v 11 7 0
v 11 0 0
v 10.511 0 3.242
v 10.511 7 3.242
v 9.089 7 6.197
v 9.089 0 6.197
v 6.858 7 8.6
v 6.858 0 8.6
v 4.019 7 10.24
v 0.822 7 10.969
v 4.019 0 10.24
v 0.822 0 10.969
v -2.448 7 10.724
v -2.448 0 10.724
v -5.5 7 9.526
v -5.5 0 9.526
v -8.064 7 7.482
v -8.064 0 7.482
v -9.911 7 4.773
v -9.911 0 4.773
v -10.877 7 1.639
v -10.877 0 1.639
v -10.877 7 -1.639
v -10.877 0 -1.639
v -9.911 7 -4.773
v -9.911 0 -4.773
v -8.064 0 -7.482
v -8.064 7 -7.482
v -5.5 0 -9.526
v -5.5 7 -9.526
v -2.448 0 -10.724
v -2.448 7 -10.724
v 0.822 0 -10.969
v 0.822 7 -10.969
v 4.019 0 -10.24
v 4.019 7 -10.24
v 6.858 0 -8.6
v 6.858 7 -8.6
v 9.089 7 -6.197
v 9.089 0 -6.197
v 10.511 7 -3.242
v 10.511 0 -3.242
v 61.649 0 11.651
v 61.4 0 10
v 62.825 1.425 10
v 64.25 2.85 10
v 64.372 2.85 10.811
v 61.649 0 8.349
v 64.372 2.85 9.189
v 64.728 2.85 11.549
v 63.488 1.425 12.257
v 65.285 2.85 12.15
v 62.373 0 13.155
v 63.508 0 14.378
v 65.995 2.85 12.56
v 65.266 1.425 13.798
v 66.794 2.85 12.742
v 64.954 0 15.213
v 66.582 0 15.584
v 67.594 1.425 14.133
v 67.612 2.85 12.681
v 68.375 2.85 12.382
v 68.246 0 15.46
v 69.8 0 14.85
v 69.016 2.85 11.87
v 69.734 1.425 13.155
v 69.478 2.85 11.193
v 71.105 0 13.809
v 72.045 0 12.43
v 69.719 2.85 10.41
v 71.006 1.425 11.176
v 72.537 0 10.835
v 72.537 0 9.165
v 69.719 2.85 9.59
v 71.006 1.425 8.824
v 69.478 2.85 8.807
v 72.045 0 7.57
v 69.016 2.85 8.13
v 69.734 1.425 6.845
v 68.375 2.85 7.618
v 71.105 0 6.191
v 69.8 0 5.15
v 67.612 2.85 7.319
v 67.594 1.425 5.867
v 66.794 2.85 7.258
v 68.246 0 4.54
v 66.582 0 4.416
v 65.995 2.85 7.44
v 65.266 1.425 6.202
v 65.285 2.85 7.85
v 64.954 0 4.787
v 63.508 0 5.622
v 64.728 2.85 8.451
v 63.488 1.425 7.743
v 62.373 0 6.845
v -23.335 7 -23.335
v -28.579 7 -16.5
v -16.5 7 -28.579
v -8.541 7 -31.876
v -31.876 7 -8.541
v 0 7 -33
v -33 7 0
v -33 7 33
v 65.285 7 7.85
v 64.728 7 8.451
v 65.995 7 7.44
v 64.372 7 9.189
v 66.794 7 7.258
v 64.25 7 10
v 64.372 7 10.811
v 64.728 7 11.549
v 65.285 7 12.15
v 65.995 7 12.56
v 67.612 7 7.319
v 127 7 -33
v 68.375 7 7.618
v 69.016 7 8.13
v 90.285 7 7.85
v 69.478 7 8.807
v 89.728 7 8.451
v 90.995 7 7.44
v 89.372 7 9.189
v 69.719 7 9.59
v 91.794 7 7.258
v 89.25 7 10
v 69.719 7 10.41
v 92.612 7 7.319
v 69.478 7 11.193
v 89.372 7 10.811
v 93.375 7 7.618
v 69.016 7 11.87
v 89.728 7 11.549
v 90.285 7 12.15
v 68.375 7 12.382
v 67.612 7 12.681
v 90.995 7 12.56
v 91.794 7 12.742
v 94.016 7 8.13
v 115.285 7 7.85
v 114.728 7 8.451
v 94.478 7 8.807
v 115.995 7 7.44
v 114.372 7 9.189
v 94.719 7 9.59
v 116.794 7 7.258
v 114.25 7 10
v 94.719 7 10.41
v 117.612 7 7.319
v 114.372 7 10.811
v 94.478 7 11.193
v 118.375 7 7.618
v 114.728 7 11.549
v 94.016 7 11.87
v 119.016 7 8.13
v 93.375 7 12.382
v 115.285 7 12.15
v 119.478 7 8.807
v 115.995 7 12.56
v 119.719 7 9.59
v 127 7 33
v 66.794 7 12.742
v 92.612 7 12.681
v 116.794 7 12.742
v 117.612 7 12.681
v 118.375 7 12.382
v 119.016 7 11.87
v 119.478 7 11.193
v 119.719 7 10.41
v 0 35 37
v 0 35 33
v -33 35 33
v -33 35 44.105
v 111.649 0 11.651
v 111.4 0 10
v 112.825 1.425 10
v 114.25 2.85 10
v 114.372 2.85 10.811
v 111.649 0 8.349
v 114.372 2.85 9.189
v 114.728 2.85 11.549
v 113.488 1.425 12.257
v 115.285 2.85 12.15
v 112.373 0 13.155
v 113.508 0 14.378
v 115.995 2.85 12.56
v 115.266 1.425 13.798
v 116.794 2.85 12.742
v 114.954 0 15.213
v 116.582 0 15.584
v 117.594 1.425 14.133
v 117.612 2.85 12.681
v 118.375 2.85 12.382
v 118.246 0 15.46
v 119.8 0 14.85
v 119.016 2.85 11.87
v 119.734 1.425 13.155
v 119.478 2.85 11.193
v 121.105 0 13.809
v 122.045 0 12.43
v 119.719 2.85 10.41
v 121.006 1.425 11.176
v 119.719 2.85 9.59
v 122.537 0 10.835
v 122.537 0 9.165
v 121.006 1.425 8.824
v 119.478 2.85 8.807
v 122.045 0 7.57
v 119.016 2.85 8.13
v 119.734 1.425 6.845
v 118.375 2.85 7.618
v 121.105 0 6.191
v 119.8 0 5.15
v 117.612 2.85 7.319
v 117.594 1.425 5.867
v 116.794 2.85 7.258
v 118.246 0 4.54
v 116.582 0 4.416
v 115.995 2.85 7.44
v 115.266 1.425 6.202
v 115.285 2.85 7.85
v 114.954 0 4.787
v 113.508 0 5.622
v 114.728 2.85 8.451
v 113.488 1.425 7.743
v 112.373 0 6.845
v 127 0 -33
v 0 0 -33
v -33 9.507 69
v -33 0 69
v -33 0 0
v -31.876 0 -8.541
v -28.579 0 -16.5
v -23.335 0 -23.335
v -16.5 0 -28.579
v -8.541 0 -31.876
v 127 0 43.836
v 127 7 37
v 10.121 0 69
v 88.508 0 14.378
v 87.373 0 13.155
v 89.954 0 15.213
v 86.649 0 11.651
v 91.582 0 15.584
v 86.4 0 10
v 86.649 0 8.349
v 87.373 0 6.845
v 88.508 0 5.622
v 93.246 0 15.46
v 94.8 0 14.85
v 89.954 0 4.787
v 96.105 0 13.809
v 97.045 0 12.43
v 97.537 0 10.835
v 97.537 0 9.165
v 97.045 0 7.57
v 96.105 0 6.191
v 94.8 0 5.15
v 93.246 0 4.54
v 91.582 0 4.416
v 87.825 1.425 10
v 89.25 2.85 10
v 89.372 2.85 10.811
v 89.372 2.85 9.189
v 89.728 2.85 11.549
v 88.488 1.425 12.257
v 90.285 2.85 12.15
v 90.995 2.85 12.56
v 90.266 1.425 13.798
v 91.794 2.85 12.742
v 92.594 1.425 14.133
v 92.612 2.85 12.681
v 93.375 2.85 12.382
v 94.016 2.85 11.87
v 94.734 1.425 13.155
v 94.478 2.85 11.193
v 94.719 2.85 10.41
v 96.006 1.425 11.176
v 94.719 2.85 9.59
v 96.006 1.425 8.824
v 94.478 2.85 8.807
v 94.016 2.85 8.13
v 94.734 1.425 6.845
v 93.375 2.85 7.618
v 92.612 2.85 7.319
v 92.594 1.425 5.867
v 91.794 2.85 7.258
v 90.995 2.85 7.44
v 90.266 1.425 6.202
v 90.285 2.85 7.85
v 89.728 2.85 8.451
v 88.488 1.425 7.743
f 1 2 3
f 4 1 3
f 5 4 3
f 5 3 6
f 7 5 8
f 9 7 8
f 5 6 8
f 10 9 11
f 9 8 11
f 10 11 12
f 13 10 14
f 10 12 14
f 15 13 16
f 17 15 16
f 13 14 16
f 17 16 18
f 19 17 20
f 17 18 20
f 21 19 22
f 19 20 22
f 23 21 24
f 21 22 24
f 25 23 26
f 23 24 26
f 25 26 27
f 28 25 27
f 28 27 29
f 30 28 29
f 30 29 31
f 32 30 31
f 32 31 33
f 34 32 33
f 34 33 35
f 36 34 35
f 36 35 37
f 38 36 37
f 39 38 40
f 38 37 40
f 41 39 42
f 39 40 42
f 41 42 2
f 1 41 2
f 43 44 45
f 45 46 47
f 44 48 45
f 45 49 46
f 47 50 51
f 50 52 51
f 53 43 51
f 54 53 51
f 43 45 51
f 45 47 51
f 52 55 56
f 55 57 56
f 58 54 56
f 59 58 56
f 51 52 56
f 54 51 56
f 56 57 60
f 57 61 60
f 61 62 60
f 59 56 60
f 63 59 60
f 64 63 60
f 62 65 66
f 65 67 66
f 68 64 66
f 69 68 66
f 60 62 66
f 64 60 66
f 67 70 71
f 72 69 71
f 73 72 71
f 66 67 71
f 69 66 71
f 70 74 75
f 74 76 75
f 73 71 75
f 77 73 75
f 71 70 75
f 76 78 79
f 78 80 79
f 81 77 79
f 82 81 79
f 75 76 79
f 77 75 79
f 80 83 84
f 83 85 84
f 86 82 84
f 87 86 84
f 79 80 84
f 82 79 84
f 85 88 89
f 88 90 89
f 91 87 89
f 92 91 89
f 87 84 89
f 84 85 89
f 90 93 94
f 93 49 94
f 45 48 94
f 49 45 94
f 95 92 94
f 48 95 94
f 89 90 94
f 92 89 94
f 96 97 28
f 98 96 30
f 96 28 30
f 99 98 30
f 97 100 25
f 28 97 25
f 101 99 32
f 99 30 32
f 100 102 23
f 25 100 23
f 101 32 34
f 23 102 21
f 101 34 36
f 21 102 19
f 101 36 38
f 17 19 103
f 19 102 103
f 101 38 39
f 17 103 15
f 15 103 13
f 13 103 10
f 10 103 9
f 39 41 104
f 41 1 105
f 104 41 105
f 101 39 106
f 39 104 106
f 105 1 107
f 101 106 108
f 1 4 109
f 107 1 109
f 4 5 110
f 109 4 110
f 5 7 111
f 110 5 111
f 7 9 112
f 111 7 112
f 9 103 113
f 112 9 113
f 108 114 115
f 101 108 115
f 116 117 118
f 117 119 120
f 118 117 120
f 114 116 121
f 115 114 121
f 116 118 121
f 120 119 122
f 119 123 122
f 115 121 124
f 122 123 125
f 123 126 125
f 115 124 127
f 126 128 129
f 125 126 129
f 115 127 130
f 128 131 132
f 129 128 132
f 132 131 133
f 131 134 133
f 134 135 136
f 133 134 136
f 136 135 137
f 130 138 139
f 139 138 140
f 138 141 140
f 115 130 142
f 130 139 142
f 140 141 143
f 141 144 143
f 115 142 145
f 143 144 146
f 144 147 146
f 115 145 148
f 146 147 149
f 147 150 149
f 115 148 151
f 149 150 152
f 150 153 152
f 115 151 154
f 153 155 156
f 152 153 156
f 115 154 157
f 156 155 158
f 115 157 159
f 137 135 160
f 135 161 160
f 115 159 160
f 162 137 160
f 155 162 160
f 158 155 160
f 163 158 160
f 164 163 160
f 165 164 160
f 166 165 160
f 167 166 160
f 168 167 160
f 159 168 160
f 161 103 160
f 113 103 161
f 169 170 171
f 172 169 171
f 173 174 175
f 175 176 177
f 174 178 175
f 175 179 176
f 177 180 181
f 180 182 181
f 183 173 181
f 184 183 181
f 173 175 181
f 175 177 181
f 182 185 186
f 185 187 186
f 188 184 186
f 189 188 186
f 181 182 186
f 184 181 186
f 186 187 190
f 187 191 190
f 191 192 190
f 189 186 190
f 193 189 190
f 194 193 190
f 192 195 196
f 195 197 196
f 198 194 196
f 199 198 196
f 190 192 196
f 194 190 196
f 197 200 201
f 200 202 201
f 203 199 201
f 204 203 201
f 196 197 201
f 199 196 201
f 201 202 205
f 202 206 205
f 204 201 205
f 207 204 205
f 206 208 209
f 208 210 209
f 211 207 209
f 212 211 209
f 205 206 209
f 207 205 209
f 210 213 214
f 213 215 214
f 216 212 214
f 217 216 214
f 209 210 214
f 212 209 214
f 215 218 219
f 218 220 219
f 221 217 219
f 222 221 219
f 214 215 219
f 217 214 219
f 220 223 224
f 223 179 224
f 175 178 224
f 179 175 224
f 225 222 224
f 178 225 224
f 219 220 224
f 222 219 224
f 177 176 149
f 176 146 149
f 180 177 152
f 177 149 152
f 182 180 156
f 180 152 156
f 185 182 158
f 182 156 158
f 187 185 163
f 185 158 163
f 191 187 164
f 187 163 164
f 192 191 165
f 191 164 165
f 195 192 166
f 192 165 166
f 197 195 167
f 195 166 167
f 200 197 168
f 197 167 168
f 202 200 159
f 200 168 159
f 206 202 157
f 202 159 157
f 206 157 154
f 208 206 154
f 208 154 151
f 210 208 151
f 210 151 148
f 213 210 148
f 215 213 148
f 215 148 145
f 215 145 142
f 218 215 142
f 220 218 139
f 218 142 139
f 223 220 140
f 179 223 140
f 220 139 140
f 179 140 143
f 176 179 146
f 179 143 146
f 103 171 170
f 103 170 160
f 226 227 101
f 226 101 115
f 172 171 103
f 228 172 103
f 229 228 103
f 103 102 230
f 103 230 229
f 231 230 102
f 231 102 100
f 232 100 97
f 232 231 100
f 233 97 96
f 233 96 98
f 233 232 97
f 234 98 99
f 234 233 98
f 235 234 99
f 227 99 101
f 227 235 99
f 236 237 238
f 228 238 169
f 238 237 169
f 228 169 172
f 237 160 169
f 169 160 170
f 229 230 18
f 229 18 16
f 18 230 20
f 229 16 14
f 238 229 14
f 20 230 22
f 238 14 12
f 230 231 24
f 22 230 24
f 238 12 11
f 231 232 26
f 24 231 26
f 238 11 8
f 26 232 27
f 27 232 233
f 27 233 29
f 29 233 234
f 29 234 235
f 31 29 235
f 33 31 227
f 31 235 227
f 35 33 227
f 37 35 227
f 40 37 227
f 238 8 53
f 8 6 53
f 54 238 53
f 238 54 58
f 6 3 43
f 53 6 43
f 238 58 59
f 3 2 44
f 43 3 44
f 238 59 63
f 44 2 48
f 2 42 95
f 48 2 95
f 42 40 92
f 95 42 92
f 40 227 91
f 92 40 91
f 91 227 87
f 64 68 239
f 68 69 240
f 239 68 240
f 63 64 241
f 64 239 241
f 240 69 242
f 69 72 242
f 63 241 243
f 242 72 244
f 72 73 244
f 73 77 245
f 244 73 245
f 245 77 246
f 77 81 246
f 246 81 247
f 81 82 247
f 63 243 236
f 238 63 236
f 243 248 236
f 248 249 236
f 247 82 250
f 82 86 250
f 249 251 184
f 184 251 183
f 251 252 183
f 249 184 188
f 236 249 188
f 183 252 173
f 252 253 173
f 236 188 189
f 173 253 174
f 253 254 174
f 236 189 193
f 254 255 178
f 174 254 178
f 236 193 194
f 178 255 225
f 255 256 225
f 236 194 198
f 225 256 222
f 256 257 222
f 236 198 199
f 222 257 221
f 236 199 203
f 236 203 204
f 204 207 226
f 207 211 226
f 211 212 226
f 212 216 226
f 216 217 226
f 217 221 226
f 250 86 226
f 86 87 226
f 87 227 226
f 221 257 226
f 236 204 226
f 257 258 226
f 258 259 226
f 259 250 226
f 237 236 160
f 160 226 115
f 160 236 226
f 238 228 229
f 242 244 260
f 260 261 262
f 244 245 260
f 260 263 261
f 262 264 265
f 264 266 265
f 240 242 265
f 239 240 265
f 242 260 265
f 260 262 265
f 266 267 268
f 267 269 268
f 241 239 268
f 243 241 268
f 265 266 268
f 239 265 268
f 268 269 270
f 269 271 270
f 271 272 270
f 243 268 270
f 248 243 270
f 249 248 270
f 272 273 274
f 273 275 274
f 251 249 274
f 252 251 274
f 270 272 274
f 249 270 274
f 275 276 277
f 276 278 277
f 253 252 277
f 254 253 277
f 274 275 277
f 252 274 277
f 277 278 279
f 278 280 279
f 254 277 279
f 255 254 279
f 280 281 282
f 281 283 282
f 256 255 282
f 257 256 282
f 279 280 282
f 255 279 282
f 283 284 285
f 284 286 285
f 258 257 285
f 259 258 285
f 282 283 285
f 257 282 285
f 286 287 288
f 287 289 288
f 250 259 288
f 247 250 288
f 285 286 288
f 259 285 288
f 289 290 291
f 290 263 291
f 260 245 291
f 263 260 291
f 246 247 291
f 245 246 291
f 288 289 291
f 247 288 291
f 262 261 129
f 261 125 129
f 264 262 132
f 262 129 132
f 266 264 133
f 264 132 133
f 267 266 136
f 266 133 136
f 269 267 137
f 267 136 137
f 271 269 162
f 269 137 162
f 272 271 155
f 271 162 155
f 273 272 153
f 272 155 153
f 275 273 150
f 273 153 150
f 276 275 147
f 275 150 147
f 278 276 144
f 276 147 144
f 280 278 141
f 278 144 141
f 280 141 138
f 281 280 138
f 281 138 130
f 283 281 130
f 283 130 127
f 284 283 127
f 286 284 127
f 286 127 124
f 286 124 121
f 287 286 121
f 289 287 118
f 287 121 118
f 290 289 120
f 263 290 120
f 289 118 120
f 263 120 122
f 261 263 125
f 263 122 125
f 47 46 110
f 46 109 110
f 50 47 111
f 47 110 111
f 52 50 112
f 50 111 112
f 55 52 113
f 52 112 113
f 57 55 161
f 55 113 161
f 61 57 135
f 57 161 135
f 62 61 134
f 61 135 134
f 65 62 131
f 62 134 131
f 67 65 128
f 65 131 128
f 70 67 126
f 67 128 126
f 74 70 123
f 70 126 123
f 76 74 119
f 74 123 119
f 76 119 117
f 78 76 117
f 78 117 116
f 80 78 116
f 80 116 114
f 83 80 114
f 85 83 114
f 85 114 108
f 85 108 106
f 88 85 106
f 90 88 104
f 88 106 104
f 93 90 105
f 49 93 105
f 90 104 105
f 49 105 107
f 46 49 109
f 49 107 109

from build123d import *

# Parameters (mm, degrees)
F0_R           = 11
F0_R_2         = 2.5
F1_DEPTH       = 7
F2_D           = 5.5
F2_CSINK_D     = 11.2
F2_CSINK_ANGLE = 90
F4_DEPTH       = 36
F5_SIZE        = 32


with BuildPart() as f1:
    # F0 (on Front) → F1 (new body)
    with BuildSketch(Plane.XZ):
        with BuildLine():
            Line((0, -33), (127, -33))
            Line((127, -33), (127, 33))
            Line((127, 33), (-33, 33))
            Line((-33, 33), (-33, 0))
            ThreePointArc((-33, 0), (-23.3345237792, -23.3345237792), (0, -33))
        make_face()
        Circle(F0_R, mode=Mode.SUBTRACT)
        with Locations((67, 10)):
            Circle(F0_R_2, mode=Mode.SUBTRACT)
        with Locations((92, 10)):
            Circle(F0_R_2, mode=Mode.SUBTRACT)
        with Locations((117, 10)):
            Circle(F0_R_2, mode=Mode.SUBTRACT)
    extrude(amount=-F1_DEPTH)

    # F2 (through all)
    with Locations(Plane.XZ):
        with Locations((117, 10), (92, 10), (67, 10)):
            CounterSinkHole(F2_D / 2, F2_CSINK_D / 2, counter_sink_angle=F2_CSINK_ANGLE)

    # F3 (on face) → F4 (join)
    with BuildSketch(Plane.XY.offset(33)):
        Polygon((0, 35), (-33, 35), (-33, 0), (127, 0), (127, 7), align=None)
    extrude(amount=F4_DEPTH)

    # F5
    f5_edges = [f1.edges().sort_by_distance(p)[0] for p in [
        (63.5, 21, 69),
    ]]
    chamfer(f5_edges, length=F5_SIZE)


solid = f1.part
